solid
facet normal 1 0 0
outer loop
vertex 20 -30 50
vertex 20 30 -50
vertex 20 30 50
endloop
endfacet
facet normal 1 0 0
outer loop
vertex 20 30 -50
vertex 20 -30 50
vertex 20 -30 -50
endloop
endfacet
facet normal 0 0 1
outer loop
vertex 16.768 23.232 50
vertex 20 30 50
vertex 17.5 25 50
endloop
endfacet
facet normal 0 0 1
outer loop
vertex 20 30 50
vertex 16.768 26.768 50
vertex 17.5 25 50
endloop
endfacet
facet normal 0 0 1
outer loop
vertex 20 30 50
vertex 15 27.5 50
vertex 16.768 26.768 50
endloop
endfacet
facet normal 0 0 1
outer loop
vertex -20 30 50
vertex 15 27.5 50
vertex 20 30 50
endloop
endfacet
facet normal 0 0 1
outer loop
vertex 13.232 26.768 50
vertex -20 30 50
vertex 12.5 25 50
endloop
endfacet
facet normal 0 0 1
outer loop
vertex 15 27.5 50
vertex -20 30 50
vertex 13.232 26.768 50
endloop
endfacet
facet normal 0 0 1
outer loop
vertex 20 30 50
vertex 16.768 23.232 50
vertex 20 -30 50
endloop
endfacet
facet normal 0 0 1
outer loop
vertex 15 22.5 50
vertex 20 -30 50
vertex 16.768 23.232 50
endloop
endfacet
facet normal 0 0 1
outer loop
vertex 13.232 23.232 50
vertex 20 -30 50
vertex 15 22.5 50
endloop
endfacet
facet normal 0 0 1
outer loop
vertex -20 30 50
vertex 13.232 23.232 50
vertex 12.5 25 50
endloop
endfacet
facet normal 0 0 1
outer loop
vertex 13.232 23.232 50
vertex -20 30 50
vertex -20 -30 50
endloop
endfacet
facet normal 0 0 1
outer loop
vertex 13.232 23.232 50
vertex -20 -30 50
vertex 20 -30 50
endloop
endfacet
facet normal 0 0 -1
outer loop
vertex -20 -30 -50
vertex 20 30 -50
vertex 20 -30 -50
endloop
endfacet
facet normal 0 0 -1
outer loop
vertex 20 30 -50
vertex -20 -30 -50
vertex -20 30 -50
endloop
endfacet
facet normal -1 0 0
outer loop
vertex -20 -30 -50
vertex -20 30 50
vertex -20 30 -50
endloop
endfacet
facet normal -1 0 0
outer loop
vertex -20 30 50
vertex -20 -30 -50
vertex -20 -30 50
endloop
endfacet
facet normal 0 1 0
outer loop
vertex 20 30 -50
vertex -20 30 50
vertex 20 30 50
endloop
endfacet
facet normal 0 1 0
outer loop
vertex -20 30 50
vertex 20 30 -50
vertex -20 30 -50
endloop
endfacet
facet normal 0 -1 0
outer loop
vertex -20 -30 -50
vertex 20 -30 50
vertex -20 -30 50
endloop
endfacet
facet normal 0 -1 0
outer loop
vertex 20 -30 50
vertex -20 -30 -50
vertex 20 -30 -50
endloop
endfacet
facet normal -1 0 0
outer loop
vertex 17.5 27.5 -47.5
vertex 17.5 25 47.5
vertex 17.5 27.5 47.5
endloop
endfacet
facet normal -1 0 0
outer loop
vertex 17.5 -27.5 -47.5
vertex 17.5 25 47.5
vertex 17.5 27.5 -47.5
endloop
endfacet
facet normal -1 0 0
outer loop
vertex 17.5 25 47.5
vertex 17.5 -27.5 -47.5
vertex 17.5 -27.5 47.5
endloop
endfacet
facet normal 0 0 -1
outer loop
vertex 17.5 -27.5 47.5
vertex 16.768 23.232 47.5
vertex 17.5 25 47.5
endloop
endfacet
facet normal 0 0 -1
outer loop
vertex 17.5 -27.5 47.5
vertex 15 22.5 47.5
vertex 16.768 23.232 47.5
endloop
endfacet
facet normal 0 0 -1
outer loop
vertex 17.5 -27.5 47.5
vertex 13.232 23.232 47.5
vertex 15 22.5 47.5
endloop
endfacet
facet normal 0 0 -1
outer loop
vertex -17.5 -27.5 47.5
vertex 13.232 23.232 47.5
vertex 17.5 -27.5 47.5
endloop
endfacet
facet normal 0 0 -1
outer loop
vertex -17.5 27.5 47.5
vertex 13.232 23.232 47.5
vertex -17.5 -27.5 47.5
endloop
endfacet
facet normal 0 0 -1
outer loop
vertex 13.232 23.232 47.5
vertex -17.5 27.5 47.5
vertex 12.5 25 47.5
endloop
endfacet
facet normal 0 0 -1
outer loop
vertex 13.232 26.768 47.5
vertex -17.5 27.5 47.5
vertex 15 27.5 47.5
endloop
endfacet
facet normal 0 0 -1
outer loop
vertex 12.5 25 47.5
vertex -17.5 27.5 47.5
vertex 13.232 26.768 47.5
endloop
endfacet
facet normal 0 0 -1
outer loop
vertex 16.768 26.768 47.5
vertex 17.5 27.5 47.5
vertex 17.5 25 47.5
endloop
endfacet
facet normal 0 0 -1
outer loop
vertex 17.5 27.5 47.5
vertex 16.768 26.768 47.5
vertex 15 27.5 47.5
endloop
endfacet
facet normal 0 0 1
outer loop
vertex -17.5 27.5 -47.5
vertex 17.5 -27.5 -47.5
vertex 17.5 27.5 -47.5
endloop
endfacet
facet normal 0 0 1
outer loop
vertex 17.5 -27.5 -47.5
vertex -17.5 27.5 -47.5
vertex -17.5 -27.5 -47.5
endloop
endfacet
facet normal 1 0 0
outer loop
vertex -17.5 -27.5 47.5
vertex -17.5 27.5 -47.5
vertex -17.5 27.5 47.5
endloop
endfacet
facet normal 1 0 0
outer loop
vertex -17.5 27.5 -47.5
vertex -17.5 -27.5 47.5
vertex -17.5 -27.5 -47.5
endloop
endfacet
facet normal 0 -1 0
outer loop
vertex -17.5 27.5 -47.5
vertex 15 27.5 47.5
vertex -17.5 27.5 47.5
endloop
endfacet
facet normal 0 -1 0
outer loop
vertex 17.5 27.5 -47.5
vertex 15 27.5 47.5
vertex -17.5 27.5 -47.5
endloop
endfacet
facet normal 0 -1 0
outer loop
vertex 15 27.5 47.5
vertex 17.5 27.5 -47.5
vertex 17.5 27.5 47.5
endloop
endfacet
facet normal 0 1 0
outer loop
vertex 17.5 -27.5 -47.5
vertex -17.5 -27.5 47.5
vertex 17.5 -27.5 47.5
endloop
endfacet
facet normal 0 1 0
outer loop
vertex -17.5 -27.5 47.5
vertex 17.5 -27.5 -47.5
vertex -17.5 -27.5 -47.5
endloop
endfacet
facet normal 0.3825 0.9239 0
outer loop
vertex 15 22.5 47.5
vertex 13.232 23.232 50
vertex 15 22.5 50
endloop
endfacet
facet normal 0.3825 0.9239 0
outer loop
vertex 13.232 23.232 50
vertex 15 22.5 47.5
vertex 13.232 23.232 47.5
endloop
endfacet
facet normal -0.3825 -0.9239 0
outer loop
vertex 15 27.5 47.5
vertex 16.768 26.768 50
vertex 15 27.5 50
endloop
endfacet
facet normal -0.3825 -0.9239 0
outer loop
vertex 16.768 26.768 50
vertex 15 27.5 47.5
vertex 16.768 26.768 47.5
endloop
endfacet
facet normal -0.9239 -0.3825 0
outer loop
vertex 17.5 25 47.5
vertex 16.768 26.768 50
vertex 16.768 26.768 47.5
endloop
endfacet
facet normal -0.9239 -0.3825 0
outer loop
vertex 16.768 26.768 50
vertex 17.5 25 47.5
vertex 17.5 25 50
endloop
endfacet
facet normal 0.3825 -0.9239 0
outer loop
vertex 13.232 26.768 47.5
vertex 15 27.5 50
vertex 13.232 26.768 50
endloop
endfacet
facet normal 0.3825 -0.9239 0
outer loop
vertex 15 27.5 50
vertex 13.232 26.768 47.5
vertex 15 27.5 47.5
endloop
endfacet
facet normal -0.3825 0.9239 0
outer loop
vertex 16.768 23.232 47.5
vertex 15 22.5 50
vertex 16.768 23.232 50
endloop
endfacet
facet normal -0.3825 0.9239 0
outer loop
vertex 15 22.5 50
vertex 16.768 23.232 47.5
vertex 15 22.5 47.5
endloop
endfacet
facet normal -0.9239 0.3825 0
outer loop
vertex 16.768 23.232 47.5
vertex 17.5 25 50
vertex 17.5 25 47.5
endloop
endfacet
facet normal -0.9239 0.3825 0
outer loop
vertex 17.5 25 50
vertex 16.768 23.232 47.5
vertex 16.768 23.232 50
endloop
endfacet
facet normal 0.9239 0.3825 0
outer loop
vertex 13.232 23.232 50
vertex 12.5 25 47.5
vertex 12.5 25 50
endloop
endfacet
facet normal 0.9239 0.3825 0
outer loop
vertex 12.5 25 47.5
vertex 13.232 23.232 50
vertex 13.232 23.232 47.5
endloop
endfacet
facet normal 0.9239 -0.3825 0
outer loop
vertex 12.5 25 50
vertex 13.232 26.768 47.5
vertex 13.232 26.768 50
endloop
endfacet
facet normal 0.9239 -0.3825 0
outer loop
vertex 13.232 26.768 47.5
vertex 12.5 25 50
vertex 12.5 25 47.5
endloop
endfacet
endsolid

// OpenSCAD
difference(){
    difference(){
        cube([40,60,100],true);
        cube([35,55,95],true);
    }
    translate([15, 25, 45])
    rotate([0,0,0])
    cylinder(h=10, r=2.5, center=true);
}
